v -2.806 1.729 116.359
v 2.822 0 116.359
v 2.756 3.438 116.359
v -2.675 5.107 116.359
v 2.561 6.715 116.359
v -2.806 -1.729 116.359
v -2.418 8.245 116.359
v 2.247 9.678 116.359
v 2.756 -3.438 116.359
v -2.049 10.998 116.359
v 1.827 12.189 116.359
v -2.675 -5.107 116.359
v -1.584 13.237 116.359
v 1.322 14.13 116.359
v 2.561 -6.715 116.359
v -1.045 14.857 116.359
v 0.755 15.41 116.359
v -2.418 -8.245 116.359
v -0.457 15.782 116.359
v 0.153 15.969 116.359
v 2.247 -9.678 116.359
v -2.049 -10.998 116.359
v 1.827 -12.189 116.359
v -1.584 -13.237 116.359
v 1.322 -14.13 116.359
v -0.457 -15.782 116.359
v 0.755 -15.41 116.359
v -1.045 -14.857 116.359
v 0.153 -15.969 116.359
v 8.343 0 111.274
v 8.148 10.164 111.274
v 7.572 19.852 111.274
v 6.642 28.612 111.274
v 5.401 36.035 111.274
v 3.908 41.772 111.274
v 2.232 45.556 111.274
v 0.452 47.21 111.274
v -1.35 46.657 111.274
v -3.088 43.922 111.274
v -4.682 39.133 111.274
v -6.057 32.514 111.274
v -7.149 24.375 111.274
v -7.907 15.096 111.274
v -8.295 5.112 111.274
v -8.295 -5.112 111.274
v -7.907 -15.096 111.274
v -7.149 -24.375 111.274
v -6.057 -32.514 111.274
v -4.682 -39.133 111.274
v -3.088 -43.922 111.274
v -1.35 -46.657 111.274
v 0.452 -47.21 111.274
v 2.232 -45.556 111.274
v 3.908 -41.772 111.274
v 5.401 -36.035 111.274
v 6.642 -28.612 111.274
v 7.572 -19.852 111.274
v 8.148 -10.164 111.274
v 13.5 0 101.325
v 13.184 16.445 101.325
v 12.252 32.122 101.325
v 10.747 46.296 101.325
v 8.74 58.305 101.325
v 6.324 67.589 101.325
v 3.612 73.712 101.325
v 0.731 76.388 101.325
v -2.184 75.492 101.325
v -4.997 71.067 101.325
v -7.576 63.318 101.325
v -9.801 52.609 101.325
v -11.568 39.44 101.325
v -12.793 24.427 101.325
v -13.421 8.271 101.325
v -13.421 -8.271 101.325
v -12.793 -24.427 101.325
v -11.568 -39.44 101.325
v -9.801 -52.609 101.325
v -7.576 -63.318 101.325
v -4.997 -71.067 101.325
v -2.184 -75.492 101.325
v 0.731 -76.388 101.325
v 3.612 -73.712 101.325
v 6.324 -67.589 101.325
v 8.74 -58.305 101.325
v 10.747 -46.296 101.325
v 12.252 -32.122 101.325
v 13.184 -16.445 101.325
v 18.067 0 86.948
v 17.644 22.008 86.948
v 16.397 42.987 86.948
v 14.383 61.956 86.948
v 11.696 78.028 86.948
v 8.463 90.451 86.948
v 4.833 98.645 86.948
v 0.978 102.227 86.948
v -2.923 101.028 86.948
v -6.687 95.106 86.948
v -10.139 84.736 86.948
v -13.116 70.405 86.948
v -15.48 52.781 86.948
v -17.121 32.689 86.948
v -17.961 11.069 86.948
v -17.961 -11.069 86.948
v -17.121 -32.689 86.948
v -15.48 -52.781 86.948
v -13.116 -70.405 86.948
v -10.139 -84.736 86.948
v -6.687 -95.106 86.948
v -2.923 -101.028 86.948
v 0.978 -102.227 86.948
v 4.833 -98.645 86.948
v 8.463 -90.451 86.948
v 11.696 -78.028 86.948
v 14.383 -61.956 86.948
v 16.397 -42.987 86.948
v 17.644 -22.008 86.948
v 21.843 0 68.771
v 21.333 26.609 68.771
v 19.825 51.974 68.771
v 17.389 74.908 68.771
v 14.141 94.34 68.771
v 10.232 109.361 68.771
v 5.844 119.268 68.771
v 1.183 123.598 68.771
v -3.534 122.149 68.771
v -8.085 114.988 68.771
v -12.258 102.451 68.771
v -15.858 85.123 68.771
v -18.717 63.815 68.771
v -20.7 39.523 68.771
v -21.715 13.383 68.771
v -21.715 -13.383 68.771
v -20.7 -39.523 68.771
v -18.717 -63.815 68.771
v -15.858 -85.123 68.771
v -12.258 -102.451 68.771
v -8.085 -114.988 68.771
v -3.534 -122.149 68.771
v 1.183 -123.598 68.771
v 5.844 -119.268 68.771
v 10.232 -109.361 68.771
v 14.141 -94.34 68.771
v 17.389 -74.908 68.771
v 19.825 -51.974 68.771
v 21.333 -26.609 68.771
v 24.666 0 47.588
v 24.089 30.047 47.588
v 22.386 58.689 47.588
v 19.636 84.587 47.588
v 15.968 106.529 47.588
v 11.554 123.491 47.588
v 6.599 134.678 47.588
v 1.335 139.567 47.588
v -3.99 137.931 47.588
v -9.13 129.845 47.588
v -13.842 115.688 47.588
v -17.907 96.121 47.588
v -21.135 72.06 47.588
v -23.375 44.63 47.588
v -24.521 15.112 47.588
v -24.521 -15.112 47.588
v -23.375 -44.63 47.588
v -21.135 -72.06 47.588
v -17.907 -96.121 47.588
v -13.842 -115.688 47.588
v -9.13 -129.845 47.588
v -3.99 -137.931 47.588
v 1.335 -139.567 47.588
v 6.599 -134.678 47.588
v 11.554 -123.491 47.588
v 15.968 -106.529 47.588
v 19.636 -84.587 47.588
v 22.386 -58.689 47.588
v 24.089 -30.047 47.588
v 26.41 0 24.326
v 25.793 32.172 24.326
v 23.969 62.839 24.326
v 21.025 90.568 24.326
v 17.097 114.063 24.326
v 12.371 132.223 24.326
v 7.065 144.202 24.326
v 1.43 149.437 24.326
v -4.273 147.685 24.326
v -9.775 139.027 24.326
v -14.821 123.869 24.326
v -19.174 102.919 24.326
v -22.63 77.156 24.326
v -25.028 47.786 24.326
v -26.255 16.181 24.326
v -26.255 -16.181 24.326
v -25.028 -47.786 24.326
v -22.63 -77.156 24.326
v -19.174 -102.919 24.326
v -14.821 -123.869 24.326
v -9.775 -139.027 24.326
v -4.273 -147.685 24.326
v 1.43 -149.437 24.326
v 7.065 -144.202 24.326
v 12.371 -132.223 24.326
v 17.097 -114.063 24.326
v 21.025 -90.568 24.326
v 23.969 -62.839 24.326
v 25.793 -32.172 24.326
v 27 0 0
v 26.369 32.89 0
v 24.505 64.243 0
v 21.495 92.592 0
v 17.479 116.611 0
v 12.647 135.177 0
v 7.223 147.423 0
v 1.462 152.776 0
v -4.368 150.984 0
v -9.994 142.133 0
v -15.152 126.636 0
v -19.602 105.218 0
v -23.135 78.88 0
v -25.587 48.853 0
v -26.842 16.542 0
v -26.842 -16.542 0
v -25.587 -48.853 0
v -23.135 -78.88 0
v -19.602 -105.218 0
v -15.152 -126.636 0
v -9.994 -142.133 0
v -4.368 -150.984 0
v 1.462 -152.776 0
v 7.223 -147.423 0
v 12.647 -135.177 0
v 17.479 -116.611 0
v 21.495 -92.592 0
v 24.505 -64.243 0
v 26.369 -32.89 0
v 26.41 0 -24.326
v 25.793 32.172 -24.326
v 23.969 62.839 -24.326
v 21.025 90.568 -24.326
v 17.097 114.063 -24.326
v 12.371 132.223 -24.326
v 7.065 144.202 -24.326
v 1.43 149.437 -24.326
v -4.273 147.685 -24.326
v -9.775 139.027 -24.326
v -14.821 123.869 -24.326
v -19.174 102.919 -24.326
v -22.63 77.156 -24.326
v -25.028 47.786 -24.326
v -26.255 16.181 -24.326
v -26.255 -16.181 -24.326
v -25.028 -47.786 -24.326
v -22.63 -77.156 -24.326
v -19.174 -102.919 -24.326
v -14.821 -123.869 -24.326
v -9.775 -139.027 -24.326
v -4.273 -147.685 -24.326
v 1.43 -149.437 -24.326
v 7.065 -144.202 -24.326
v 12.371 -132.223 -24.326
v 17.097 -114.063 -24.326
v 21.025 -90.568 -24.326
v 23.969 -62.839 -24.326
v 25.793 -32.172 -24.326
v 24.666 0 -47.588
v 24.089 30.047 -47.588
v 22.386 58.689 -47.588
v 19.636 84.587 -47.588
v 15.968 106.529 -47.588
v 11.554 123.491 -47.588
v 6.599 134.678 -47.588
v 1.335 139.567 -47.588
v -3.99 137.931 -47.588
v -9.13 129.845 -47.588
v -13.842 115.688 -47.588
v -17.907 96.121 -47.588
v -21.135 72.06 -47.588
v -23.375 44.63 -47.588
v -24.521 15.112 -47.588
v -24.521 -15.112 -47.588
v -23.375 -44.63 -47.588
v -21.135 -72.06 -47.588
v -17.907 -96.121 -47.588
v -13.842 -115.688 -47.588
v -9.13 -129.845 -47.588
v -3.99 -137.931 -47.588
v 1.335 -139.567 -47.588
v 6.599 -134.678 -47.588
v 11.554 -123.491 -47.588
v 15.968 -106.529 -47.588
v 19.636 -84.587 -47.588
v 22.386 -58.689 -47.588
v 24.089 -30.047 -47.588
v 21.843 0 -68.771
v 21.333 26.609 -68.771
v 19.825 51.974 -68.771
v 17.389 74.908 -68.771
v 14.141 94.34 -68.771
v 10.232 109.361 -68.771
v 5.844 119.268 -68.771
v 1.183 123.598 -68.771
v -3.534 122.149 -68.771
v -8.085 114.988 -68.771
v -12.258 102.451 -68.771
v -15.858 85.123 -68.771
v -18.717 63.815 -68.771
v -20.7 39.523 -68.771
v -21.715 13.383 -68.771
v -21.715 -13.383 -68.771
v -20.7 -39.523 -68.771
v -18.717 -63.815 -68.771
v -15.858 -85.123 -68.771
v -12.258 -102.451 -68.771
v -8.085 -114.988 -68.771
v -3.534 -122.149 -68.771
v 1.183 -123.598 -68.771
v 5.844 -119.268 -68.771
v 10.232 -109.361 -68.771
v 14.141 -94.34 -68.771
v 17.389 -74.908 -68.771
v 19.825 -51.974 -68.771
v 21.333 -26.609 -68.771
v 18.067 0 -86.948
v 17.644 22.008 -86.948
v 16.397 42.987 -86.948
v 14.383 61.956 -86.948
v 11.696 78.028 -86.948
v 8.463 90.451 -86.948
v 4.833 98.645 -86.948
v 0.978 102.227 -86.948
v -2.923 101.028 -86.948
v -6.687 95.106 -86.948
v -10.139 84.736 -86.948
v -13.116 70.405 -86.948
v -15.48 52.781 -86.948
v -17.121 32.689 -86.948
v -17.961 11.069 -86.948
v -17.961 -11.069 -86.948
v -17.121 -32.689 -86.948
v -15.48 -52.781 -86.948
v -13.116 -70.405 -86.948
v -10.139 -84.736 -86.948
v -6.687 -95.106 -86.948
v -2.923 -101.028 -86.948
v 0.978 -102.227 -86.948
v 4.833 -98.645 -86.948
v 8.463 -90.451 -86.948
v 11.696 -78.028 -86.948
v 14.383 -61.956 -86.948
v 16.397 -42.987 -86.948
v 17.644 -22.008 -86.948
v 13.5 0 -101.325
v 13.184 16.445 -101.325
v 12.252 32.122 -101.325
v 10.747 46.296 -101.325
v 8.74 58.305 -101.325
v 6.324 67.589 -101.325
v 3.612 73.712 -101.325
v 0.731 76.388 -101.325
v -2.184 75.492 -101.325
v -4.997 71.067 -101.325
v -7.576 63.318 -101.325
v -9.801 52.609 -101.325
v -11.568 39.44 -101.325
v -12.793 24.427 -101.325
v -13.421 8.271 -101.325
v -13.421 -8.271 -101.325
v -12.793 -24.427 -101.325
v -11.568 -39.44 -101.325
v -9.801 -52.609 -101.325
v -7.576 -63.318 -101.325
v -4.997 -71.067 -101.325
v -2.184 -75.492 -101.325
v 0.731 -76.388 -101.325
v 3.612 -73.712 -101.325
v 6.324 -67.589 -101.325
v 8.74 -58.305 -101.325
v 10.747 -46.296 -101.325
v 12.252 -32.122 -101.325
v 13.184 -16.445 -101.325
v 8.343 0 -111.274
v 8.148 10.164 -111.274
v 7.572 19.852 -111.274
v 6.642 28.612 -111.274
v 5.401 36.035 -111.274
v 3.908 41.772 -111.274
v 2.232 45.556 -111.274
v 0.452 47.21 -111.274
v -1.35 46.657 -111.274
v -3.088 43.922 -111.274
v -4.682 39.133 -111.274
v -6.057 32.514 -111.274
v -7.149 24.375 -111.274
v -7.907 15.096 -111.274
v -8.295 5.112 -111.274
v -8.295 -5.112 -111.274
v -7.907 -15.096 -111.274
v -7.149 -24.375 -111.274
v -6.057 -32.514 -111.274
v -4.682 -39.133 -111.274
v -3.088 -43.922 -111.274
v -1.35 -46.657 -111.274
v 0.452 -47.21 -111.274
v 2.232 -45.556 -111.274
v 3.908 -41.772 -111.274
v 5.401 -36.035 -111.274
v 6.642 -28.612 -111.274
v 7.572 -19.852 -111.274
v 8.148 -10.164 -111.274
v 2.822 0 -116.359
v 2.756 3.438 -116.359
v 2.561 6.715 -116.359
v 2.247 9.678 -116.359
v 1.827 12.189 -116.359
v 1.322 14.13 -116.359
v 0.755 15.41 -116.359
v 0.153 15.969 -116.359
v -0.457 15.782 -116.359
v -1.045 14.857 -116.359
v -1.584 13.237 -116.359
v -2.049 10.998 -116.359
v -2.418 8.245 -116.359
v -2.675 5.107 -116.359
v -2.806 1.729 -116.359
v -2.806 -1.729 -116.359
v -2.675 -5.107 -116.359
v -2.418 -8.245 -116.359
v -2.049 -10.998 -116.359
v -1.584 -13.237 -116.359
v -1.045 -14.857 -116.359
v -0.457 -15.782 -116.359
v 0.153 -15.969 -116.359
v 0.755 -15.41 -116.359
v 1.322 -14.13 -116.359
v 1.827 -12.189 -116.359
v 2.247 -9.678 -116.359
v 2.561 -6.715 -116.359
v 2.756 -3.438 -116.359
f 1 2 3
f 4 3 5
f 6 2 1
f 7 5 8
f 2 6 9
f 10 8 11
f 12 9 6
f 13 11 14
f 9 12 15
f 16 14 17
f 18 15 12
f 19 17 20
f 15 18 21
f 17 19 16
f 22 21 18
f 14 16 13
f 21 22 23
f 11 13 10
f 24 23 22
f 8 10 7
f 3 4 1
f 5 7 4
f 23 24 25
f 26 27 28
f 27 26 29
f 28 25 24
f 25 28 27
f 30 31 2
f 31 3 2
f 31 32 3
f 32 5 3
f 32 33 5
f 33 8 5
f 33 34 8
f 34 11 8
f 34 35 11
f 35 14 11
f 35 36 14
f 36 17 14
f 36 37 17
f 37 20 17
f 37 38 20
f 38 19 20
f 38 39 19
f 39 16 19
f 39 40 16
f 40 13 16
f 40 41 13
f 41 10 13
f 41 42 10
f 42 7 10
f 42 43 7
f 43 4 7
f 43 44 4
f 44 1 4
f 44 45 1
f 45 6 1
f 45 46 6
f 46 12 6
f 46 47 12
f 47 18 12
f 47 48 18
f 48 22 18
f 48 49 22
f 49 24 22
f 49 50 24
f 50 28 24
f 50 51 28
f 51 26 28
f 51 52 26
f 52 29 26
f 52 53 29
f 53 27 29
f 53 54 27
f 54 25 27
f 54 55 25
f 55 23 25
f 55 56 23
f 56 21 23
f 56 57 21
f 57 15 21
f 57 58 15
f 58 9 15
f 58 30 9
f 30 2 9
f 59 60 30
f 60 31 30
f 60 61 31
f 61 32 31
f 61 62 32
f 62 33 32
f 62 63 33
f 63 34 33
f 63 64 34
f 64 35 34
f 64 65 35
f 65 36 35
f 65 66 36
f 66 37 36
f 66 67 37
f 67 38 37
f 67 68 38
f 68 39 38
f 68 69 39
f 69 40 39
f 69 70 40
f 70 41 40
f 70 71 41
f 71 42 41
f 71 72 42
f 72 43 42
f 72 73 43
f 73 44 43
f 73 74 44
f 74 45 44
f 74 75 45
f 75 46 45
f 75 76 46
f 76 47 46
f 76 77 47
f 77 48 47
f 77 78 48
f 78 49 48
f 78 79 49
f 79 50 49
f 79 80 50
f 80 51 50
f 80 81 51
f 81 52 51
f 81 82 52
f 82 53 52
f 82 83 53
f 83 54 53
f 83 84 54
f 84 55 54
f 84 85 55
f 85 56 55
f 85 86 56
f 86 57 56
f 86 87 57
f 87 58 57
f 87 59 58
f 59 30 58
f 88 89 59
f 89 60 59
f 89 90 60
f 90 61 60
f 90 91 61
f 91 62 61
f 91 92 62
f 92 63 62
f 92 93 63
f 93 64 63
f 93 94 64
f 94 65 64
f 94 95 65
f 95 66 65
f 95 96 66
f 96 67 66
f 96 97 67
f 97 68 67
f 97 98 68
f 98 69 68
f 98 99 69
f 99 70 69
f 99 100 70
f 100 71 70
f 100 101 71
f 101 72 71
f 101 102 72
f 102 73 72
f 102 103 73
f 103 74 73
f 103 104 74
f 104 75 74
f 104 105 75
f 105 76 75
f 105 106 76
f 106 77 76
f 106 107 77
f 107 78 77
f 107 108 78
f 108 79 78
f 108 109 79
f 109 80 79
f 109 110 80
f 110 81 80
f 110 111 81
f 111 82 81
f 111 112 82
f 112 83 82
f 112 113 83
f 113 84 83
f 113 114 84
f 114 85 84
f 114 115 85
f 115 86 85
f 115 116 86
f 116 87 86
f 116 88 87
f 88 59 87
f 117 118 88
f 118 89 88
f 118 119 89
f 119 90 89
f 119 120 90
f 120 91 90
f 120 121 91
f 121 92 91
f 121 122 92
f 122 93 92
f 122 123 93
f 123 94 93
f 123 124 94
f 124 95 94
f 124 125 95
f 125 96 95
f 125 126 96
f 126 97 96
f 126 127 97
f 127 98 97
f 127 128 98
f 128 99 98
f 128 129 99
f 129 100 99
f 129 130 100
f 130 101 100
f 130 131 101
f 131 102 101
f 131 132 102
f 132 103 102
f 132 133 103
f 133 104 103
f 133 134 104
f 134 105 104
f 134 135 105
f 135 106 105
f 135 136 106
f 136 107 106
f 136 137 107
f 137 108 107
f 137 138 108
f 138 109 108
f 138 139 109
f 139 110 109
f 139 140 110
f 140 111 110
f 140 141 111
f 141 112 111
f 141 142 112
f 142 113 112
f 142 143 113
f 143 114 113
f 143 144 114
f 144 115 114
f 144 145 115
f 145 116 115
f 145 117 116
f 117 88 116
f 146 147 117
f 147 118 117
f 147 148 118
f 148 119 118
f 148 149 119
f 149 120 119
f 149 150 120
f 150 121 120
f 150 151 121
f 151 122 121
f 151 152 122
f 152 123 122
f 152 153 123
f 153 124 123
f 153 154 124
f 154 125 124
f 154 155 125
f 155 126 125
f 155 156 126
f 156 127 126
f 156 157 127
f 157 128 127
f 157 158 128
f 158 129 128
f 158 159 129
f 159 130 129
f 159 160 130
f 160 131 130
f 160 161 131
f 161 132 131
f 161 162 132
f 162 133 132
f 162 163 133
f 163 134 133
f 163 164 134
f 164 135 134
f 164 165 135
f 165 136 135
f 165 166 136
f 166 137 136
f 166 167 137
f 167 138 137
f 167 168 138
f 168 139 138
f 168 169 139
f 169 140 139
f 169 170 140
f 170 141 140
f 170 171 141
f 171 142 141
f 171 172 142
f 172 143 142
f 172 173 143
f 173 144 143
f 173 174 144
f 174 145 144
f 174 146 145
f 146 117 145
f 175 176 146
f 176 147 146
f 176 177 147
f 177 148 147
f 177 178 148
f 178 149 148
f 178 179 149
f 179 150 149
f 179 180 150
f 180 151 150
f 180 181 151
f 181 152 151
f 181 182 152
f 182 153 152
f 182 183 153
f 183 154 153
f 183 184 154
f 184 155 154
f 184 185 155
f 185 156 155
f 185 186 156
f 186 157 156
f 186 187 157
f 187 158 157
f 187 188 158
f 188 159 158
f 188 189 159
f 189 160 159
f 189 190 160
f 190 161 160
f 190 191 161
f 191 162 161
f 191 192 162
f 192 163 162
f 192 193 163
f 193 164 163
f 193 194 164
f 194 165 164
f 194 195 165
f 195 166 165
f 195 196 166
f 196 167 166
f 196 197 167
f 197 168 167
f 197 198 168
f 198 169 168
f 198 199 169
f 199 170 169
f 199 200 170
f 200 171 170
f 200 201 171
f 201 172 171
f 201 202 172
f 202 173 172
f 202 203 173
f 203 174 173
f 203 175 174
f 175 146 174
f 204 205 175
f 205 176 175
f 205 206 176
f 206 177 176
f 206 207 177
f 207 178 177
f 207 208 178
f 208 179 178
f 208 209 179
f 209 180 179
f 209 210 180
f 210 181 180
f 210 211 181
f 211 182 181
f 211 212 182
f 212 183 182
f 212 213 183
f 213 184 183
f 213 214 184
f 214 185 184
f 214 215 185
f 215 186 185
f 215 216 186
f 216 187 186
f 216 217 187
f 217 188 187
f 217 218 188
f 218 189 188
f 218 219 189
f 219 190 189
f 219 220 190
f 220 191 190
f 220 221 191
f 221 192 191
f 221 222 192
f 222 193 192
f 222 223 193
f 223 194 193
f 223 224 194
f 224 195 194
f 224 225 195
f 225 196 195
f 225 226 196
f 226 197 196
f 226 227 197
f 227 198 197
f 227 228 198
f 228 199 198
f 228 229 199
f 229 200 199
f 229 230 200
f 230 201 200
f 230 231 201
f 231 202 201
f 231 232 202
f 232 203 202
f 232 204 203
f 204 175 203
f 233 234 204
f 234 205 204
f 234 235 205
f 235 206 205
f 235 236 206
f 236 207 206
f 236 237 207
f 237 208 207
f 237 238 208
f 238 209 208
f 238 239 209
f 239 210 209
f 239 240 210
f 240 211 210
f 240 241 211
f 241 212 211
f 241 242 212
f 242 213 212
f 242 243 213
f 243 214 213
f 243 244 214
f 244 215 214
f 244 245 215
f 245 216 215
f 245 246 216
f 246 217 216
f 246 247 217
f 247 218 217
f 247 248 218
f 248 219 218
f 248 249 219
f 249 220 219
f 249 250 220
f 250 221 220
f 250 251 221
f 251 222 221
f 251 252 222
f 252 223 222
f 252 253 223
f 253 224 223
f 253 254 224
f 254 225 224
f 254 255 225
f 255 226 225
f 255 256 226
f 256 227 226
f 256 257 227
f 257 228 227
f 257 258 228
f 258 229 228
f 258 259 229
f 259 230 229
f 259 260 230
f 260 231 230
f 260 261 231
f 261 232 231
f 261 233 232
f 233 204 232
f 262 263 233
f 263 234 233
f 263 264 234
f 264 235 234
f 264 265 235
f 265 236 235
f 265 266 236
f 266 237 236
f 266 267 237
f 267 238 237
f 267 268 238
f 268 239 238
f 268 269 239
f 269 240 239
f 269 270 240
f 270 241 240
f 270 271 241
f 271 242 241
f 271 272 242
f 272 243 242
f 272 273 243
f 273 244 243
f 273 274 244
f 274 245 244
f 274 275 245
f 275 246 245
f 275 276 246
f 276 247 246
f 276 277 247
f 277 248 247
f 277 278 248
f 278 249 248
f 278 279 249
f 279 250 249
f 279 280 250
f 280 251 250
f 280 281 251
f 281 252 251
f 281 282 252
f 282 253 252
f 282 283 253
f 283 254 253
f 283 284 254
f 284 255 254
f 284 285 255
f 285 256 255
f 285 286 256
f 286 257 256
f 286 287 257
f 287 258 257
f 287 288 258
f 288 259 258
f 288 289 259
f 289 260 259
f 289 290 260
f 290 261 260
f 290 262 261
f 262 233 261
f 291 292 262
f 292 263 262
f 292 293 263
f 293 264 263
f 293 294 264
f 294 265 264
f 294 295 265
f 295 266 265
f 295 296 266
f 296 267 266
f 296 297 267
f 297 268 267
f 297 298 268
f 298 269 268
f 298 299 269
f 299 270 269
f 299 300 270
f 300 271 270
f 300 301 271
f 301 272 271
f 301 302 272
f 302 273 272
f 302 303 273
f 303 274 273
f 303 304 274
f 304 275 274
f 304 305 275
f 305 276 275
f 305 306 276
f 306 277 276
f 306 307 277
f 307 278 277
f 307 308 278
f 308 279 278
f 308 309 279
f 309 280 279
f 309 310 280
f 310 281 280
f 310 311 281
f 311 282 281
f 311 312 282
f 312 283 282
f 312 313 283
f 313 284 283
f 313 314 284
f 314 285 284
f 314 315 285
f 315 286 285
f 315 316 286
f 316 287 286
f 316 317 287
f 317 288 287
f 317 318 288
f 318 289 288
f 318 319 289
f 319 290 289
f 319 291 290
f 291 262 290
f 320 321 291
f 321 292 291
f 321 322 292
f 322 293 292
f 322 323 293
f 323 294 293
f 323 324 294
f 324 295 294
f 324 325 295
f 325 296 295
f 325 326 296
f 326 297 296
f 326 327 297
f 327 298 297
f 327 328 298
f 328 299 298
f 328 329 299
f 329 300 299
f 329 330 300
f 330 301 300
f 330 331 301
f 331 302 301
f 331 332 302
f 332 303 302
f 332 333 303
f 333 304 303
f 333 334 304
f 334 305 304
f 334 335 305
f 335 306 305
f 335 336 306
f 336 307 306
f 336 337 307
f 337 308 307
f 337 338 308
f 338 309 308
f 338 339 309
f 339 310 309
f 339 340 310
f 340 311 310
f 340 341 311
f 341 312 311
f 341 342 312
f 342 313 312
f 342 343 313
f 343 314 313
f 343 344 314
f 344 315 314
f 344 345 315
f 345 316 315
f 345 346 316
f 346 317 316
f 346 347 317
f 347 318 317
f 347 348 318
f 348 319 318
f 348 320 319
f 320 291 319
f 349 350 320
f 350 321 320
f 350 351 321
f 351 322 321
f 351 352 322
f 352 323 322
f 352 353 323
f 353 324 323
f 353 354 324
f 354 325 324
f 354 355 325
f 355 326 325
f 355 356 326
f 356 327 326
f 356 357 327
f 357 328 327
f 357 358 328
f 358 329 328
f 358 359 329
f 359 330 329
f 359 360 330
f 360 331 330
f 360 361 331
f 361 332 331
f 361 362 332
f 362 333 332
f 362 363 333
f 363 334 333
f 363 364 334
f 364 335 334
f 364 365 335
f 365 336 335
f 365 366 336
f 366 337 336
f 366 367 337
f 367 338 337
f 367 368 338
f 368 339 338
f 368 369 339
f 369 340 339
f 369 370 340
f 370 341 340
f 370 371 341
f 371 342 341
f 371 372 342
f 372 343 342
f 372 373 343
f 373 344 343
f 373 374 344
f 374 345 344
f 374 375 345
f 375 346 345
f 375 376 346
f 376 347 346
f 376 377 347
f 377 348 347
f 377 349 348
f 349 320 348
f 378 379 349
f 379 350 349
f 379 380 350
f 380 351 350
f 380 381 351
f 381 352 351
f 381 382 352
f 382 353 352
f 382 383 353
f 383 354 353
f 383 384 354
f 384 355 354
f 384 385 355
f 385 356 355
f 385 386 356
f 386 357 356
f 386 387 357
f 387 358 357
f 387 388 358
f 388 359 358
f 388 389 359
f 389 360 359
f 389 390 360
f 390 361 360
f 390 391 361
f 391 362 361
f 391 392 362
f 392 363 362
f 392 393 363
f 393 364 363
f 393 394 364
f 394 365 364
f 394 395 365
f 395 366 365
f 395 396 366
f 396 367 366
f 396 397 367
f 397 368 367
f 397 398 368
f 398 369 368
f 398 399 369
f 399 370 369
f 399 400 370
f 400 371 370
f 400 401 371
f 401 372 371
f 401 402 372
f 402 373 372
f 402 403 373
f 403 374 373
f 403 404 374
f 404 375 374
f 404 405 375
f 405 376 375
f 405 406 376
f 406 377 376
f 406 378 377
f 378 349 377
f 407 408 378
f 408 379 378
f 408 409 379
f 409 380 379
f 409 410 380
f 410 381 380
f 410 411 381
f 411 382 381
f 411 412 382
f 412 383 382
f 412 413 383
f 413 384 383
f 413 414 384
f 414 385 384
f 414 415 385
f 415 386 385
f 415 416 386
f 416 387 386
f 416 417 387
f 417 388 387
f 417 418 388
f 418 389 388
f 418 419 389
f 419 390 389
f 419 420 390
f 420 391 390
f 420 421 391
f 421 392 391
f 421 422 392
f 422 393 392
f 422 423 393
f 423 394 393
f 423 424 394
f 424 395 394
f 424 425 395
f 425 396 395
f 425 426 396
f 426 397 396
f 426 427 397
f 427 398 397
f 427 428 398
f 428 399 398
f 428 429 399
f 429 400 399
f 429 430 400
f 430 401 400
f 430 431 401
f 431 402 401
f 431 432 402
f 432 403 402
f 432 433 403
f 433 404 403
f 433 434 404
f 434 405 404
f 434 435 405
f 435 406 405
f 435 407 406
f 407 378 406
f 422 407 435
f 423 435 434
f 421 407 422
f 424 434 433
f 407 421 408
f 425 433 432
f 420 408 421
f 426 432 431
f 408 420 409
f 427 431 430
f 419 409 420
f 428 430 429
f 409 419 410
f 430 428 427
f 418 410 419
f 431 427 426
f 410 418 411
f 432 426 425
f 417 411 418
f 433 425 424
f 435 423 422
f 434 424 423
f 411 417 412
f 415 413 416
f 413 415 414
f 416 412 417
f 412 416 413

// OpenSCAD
// Generated by SolidPython 1.0.1 on 2020-07-29 00:46:46


scale(v = [3, 17, 13]) {
	sphere(r = 9);
}
/***********************************************
*********      SolidPython code:      **********
************************************************
 
# import packages: SolidPython
from solid import *
from solid.utils import *
from itertools import chain, combinations, permutations


class Resize:

    def __init__(self, scad_file):
        self.scad_file = scad_file
        #self.scad_file = import_scad(scad_file)
        # cone/cylinder param:
        self.r1 = 0
        self.r2 = 0
        self.h = 0
        # rectangular prism param:
        self.w = 0
        self.l = 0
        # ellipse param:
        self.r = 0

    # import OpenScad code (file name corresponds to shape)


    # classify shape + parameters
    def assign(self, param1, param2, param3):
        if self.scad_file == 'cone.scad':
            self.r1 = param1
            self.r2 = param2
            self.h = param3
        elif self.scad_file == 'cylinder.scad':
            self.r1 = param1
            self.r2 = param2
            self.h = param3
        elif self.scad_file == 'rectangularPrism.scad':
            self.h = param1
            self.l = param2
            self.w = param3
        else:
            self.r = param1
            self.h = param2

    # resize parameters
    def iterate(self):
        x = range(3, 20, 2)
        i = 1
        if self.scad_file == 'cone.scad':
            tempList = list(permutations(x, 2))
            for temp in tempList:
                param1 = temp[0]
                param2 = temp[1]
                filepath = 'produced_scad_files/' + 'cone' + str(param1) + '_' + str(param2) + '_' + '.scad'
                scad_render_to_file(cylinder(h=param1, r1=param2, r2=0), filepath)

        elif self.scad_file == 'cylinder.scad':
            tempList = list(permutations(x, 3))
            for temp in tempList:
                param1 = temp[0]
                param2 = temp[1]
                filepath = 'produced_scad_files/' + 'cylinder' + str(param1) + '_' + str(param2) + '_' + '.scad'
                scad_render_to_file(cylinder(h=param1, r1=param2, r2=param2), filepath)

        elif self.scad_file == 'rectangularPrism.scad':
            tempList = list(permutations(x, 3))
            for temp in tempList:
                param1 = temp[0]
                param2 = temp[1]
                param3 = temp[2]
                filepath = 'produced_scad_files/' + 'rectangularPrism' + str(param1) + '_' + str(param2) + '_' + str(
                    param3) + '.scad'
                scad_render_to_file(cube(size=(param1, param2, param3)), filepath)

        elif self.scad_file == 'ellipse.scad':
            tempList = list(permutations(x, 4))
            for temp in tempList:
                param1 = temp[0]
                param2 = temp[1]
                param3 = temp[2]
                param4 = temp[3]
                filepath = 'produced_scad_files/' + 'ellipse' + str(param1) + '_' + str(param2) + '_' + str(param3) + '_' + str(param4) + '.scad'
                scad_render_to_file(scale([param1, param2, param3])(sphere(r=param4)), filepath)

    def render_to_scadfile(self):
        scad_render_to_file(scad, 'example.scad') 
 
************************************************/
